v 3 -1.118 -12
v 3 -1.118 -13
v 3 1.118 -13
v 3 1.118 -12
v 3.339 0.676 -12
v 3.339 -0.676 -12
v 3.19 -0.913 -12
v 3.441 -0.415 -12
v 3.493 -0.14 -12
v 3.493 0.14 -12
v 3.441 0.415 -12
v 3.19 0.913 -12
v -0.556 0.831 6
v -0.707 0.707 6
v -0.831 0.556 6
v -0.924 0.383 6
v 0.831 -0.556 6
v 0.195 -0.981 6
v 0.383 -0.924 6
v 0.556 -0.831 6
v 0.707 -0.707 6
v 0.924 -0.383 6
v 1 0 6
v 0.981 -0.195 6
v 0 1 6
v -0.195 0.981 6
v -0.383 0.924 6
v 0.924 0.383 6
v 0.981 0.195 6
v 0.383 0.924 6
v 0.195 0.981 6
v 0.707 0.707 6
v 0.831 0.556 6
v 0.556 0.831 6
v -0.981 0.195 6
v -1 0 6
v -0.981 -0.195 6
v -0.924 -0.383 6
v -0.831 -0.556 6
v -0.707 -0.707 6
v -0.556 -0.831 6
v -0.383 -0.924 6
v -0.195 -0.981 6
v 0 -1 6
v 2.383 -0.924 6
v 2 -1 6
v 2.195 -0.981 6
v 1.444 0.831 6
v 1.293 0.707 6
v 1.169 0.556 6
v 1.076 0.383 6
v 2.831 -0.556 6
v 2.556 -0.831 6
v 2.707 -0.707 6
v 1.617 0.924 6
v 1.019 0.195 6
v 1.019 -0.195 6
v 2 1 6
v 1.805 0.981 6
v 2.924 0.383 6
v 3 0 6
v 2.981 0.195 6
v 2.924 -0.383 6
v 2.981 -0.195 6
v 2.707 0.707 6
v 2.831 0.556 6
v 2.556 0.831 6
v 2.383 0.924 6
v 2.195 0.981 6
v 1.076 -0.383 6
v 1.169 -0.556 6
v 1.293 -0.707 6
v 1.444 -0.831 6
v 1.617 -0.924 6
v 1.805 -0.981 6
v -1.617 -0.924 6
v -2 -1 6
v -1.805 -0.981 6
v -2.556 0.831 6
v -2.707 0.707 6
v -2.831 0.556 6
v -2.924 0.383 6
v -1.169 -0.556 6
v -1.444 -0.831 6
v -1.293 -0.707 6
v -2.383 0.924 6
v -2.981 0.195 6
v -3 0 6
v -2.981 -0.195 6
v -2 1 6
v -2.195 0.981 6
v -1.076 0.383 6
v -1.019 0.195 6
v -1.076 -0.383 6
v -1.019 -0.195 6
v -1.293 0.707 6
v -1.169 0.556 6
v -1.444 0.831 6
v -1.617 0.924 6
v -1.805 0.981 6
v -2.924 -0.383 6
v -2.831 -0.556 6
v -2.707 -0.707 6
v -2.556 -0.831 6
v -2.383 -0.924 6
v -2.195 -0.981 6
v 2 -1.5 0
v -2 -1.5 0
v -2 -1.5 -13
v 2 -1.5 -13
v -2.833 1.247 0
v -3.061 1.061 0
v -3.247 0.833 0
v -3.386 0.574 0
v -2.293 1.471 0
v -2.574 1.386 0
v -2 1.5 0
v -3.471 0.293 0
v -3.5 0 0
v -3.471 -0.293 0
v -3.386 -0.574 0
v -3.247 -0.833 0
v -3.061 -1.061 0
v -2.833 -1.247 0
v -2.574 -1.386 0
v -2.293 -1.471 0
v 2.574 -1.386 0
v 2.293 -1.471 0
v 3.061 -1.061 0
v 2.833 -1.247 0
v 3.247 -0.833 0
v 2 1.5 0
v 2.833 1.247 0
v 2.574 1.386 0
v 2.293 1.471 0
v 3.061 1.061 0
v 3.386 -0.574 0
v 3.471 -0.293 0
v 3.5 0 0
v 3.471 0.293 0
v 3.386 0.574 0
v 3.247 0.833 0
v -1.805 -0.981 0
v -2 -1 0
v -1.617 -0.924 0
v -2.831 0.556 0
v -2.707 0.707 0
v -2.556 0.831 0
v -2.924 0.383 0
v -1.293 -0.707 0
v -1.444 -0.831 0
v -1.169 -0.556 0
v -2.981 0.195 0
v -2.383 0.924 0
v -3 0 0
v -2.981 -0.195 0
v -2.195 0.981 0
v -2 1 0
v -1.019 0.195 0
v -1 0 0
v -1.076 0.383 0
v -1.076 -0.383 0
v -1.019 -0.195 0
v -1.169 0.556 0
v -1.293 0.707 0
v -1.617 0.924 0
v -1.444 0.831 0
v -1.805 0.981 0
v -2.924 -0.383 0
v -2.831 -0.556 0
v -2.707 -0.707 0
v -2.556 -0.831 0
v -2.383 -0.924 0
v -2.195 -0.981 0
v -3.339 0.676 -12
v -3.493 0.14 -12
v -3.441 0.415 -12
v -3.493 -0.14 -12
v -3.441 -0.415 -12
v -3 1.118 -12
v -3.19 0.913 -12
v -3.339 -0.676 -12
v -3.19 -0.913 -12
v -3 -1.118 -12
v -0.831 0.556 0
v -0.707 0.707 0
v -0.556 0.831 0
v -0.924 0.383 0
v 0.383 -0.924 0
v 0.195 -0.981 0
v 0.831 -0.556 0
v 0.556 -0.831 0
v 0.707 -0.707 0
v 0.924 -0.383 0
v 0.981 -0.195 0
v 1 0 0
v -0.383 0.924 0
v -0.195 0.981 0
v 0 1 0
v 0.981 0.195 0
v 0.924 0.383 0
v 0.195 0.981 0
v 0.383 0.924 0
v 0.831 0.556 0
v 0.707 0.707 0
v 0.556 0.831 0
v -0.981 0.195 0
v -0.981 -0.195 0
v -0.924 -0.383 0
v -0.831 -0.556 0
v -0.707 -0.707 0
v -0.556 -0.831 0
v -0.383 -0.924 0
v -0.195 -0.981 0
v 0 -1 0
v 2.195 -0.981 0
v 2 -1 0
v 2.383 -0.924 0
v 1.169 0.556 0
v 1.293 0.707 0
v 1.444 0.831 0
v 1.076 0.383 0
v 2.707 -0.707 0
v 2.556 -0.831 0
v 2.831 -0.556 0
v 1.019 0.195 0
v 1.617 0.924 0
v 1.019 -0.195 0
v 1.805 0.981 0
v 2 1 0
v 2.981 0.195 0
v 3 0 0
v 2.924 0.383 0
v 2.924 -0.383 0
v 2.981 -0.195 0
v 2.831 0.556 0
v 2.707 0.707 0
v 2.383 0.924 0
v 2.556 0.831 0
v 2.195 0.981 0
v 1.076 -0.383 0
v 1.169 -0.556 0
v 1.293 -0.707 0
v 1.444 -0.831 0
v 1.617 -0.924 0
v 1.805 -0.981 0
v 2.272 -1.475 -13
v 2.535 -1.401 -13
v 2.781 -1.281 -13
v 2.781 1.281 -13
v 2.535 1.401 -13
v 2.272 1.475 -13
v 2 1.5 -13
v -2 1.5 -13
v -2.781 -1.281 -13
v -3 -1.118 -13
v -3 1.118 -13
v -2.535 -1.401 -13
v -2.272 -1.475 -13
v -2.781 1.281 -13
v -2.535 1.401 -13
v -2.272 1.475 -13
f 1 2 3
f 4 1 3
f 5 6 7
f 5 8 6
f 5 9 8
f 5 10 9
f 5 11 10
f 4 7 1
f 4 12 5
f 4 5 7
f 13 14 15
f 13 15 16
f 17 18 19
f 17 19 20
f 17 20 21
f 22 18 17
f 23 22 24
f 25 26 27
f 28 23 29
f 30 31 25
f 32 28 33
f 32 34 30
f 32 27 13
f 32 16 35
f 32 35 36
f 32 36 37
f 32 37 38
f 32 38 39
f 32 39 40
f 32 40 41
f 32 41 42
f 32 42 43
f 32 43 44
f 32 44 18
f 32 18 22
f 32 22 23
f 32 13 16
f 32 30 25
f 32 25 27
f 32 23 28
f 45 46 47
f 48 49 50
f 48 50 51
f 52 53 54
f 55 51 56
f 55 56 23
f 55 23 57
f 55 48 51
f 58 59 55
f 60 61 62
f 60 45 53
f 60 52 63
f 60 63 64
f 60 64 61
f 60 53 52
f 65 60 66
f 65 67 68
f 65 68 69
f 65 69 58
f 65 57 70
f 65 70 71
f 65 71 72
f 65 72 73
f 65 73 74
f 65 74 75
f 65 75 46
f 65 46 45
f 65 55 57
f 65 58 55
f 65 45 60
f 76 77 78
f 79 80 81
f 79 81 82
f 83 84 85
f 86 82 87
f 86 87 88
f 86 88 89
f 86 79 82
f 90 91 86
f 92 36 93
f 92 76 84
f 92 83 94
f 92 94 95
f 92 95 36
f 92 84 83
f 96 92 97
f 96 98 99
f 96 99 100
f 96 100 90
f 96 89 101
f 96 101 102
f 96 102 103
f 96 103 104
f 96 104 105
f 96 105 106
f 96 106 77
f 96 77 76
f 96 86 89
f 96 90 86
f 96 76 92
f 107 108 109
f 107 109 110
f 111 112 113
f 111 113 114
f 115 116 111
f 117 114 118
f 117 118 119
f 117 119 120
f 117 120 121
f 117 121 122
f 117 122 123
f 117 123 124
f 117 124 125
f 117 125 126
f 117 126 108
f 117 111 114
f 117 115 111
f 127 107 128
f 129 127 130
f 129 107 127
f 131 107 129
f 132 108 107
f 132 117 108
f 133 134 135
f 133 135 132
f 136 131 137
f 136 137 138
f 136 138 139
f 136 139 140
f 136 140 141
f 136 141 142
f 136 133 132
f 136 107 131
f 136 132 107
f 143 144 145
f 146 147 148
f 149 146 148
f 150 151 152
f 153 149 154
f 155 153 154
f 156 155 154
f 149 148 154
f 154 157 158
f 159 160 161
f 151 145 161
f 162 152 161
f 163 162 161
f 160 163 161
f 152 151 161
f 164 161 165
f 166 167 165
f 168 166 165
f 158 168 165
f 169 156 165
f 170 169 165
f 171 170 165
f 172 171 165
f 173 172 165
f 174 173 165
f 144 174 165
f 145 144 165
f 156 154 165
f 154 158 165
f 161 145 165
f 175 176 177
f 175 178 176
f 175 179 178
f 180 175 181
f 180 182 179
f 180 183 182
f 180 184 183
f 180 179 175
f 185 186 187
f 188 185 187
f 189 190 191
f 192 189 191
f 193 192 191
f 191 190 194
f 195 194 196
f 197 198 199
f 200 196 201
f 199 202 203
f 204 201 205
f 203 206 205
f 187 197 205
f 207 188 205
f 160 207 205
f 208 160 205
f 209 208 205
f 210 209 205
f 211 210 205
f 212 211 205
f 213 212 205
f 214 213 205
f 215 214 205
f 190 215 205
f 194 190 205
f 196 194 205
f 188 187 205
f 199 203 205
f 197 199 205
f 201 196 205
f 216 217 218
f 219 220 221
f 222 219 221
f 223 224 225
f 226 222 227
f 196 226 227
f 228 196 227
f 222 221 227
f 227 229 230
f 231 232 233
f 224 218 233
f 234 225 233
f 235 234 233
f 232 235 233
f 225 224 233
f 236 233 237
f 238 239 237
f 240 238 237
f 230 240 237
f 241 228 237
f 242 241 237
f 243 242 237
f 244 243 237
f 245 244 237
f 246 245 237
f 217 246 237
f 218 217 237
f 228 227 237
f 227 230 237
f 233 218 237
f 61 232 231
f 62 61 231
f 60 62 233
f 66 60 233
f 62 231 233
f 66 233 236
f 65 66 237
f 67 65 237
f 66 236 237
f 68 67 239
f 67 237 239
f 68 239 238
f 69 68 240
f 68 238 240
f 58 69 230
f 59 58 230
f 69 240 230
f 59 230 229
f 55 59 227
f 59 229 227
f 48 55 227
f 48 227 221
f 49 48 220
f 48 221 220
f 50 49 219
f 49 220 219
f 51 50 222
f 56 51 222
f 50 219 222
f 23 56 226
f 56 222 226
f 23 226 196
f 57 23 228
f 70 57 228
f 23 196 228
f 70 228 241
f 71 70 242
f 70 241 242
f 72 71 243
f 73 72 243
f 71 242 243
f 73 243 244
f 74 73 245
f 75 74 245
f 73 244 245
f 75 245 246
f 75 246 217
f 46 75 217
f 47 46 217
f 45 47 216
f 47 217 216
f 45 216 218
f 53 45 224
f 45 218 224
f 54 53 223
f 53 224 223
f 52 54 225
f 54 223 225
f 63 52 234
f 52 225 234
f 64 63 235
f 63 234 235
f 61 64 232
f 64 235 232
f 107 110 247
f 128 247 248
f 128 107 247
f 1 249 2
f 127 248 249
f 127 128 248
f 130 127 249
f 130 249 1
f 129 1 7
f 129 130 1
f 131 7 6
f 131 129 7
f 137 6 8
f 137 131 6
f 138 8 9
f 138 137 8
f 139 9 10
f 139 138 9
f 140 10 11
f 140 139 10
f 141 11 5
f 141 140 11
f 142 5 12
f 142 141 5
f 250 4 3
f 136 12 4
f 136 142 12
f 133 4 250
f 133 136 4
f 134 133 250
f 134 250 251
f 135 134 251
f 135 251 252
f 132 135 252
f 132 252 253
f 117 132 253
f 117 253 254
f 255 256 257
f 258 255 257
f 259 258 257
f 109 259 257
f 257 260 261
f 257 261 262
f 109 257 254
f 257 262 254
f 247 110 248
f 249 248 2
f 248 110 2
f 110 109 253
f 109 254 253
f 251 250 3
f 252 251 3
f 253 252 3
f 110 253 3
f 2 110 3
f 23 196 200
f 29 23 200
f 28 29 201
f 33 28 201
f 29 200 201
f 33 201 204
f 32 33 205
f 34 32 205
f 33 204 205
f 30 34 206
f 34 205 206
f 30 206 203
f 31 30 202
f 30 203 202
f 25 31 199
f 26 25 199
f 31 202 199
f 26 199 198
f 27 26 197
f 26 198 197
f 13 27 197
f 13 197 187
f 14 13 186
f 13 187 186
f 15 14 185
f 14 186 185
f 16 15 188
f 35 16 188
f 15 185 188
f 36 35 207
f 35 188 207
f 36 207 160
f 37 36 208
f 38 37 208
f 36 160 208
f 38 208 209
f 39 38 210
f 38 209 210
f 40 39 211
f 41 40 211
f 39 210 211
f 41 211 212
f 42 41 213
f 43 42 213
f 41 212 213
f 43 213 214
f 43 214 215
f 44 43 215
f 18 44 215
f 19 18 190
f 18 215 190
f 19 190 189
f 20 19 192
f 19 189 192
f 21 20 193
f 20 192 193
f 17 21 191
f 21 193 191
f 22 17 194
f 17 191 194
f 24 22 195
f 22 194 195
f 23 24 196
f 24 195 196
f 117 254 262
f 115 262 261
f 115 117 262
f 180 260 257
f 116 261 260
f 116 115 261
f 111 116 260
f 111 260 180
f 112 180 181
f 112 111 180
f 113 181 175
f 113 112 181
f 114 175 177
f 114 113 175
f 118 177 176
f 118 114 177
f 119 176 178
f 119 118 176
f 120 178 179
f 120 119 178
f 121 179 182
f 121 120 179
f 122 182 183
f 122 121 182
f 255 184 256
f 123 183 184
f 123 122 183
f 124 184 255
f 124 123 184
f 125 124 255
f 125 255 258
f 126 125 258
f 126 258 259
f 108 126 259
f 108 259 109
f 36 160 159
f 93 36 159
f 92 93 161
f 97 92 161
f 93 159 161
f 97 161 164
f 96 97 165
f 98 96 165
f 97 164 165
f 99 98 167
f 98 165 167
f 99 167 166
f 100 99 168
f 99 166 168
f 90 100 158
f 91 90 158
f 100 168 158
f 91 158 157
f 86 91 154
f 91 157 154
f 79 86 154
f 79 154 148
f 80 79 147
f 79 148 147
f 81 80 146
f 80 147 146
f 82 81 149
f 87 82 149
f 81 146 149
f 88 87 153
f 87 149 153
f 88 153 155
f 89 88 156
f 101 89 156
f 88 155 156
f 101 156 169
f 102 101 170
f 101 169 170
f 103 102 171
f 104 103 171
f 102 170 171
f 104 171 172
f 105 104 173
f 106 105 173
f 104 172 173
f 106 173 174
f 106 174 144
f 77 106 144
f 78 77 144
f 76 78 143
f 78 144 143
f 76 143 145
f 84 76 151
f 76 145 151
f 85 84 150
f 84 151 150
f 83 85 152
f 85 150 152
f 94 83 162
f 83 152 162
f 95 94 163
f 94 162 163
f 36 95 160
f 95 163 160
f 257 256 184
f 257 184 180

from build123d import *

# Parameters (mm, degrees)
SKETCH_1_R          = 1
EXTRUDE_1_DEPTH     = 6
EXTRUDE_1_2_DEPTH   = 6
EXTRUDE_1_3_DEPTH   = 6
EXTRUDE_5_DEPTH     = 13
SKETCH_3_W          = 1.364124089
SKETCH_3_H          = 6.403769564
SKETCH_3_W_2        = 2.240486341
SKETCH_3_H_2        = 5.419092784
CUT_EXTRUDE_1_DEPTH = 1


with BuildPart() as part:
    # Эскиз1 → Бобышка-Вытянуть1 (new body)
    with BuildSketch(Plane.XY):
        with Locations((-2, 0)):
            Circle(SKETCH_1_R)
    extrude(amount=EXTRUDE_1_DEPTH)


with BuildPart() as body_2:
    # Эскиз1 → Extrude 1 2 (new body)
    with BuildSketch(Plane.XY):
        Circle(SKETCH_1_R)
    extrude(amount=EXTRUDE_1_2_DEPTH)


with BuildPart() as body_3:
    # Эскиз1 → Extrude 1 3 (new body)
    with BuildSketch(Plane.XY):
        with Locations((2, 0)):
            Circle(SKETCH_1_R)
    extrude(amount=EXTRUDE_1_3_DEPTH)


with BuildPart() as body_4:
    # Эскиз2 → Бобышка-Вытянуть5 (new body)
    with BuildSketch(Plane(origin=(0, 0, 0), x_dir=(-1, 0, 0), z_dir=(0, 0, -1))):
        with BuildLine():
            Line((-2, 1.5), (2, 1.5))
            ThreePointArc((2, 1.5), (3.5, 0), (2, -1.5))
            Line((2, -1.5), (-2, -1.5))
            ThreePointArc((-2, -1.5), (-3.5, 0), (-2, 1.5))
        make_face()
    extrude(amount=EXTRUDE_5_DEPTH)

    # Эскиз3 → Вырез-Вытянуть1 (cut)
    with BuildSketch(Plane(origin=(0, 0, -13), x_dir=(-1, 0, 0), z_dir=(0, 0, -1))):
        with Locations((3.682062045, -0.167934068)):
            Rectangle(SKETCH_3_W, SKETCH_3_H)
        with Locations((-4.120243171, 0.324404322)):
            Rectangle(SKETCH_3_W_2, SKETCH_3_H_2)
    extrude(amount=-CUT_EXTRUDE_1_DEPTH, mode=Mode.SUBTRACT)


solid = Compound([part.part, body_2.part, body_3.part, body_4.part])
